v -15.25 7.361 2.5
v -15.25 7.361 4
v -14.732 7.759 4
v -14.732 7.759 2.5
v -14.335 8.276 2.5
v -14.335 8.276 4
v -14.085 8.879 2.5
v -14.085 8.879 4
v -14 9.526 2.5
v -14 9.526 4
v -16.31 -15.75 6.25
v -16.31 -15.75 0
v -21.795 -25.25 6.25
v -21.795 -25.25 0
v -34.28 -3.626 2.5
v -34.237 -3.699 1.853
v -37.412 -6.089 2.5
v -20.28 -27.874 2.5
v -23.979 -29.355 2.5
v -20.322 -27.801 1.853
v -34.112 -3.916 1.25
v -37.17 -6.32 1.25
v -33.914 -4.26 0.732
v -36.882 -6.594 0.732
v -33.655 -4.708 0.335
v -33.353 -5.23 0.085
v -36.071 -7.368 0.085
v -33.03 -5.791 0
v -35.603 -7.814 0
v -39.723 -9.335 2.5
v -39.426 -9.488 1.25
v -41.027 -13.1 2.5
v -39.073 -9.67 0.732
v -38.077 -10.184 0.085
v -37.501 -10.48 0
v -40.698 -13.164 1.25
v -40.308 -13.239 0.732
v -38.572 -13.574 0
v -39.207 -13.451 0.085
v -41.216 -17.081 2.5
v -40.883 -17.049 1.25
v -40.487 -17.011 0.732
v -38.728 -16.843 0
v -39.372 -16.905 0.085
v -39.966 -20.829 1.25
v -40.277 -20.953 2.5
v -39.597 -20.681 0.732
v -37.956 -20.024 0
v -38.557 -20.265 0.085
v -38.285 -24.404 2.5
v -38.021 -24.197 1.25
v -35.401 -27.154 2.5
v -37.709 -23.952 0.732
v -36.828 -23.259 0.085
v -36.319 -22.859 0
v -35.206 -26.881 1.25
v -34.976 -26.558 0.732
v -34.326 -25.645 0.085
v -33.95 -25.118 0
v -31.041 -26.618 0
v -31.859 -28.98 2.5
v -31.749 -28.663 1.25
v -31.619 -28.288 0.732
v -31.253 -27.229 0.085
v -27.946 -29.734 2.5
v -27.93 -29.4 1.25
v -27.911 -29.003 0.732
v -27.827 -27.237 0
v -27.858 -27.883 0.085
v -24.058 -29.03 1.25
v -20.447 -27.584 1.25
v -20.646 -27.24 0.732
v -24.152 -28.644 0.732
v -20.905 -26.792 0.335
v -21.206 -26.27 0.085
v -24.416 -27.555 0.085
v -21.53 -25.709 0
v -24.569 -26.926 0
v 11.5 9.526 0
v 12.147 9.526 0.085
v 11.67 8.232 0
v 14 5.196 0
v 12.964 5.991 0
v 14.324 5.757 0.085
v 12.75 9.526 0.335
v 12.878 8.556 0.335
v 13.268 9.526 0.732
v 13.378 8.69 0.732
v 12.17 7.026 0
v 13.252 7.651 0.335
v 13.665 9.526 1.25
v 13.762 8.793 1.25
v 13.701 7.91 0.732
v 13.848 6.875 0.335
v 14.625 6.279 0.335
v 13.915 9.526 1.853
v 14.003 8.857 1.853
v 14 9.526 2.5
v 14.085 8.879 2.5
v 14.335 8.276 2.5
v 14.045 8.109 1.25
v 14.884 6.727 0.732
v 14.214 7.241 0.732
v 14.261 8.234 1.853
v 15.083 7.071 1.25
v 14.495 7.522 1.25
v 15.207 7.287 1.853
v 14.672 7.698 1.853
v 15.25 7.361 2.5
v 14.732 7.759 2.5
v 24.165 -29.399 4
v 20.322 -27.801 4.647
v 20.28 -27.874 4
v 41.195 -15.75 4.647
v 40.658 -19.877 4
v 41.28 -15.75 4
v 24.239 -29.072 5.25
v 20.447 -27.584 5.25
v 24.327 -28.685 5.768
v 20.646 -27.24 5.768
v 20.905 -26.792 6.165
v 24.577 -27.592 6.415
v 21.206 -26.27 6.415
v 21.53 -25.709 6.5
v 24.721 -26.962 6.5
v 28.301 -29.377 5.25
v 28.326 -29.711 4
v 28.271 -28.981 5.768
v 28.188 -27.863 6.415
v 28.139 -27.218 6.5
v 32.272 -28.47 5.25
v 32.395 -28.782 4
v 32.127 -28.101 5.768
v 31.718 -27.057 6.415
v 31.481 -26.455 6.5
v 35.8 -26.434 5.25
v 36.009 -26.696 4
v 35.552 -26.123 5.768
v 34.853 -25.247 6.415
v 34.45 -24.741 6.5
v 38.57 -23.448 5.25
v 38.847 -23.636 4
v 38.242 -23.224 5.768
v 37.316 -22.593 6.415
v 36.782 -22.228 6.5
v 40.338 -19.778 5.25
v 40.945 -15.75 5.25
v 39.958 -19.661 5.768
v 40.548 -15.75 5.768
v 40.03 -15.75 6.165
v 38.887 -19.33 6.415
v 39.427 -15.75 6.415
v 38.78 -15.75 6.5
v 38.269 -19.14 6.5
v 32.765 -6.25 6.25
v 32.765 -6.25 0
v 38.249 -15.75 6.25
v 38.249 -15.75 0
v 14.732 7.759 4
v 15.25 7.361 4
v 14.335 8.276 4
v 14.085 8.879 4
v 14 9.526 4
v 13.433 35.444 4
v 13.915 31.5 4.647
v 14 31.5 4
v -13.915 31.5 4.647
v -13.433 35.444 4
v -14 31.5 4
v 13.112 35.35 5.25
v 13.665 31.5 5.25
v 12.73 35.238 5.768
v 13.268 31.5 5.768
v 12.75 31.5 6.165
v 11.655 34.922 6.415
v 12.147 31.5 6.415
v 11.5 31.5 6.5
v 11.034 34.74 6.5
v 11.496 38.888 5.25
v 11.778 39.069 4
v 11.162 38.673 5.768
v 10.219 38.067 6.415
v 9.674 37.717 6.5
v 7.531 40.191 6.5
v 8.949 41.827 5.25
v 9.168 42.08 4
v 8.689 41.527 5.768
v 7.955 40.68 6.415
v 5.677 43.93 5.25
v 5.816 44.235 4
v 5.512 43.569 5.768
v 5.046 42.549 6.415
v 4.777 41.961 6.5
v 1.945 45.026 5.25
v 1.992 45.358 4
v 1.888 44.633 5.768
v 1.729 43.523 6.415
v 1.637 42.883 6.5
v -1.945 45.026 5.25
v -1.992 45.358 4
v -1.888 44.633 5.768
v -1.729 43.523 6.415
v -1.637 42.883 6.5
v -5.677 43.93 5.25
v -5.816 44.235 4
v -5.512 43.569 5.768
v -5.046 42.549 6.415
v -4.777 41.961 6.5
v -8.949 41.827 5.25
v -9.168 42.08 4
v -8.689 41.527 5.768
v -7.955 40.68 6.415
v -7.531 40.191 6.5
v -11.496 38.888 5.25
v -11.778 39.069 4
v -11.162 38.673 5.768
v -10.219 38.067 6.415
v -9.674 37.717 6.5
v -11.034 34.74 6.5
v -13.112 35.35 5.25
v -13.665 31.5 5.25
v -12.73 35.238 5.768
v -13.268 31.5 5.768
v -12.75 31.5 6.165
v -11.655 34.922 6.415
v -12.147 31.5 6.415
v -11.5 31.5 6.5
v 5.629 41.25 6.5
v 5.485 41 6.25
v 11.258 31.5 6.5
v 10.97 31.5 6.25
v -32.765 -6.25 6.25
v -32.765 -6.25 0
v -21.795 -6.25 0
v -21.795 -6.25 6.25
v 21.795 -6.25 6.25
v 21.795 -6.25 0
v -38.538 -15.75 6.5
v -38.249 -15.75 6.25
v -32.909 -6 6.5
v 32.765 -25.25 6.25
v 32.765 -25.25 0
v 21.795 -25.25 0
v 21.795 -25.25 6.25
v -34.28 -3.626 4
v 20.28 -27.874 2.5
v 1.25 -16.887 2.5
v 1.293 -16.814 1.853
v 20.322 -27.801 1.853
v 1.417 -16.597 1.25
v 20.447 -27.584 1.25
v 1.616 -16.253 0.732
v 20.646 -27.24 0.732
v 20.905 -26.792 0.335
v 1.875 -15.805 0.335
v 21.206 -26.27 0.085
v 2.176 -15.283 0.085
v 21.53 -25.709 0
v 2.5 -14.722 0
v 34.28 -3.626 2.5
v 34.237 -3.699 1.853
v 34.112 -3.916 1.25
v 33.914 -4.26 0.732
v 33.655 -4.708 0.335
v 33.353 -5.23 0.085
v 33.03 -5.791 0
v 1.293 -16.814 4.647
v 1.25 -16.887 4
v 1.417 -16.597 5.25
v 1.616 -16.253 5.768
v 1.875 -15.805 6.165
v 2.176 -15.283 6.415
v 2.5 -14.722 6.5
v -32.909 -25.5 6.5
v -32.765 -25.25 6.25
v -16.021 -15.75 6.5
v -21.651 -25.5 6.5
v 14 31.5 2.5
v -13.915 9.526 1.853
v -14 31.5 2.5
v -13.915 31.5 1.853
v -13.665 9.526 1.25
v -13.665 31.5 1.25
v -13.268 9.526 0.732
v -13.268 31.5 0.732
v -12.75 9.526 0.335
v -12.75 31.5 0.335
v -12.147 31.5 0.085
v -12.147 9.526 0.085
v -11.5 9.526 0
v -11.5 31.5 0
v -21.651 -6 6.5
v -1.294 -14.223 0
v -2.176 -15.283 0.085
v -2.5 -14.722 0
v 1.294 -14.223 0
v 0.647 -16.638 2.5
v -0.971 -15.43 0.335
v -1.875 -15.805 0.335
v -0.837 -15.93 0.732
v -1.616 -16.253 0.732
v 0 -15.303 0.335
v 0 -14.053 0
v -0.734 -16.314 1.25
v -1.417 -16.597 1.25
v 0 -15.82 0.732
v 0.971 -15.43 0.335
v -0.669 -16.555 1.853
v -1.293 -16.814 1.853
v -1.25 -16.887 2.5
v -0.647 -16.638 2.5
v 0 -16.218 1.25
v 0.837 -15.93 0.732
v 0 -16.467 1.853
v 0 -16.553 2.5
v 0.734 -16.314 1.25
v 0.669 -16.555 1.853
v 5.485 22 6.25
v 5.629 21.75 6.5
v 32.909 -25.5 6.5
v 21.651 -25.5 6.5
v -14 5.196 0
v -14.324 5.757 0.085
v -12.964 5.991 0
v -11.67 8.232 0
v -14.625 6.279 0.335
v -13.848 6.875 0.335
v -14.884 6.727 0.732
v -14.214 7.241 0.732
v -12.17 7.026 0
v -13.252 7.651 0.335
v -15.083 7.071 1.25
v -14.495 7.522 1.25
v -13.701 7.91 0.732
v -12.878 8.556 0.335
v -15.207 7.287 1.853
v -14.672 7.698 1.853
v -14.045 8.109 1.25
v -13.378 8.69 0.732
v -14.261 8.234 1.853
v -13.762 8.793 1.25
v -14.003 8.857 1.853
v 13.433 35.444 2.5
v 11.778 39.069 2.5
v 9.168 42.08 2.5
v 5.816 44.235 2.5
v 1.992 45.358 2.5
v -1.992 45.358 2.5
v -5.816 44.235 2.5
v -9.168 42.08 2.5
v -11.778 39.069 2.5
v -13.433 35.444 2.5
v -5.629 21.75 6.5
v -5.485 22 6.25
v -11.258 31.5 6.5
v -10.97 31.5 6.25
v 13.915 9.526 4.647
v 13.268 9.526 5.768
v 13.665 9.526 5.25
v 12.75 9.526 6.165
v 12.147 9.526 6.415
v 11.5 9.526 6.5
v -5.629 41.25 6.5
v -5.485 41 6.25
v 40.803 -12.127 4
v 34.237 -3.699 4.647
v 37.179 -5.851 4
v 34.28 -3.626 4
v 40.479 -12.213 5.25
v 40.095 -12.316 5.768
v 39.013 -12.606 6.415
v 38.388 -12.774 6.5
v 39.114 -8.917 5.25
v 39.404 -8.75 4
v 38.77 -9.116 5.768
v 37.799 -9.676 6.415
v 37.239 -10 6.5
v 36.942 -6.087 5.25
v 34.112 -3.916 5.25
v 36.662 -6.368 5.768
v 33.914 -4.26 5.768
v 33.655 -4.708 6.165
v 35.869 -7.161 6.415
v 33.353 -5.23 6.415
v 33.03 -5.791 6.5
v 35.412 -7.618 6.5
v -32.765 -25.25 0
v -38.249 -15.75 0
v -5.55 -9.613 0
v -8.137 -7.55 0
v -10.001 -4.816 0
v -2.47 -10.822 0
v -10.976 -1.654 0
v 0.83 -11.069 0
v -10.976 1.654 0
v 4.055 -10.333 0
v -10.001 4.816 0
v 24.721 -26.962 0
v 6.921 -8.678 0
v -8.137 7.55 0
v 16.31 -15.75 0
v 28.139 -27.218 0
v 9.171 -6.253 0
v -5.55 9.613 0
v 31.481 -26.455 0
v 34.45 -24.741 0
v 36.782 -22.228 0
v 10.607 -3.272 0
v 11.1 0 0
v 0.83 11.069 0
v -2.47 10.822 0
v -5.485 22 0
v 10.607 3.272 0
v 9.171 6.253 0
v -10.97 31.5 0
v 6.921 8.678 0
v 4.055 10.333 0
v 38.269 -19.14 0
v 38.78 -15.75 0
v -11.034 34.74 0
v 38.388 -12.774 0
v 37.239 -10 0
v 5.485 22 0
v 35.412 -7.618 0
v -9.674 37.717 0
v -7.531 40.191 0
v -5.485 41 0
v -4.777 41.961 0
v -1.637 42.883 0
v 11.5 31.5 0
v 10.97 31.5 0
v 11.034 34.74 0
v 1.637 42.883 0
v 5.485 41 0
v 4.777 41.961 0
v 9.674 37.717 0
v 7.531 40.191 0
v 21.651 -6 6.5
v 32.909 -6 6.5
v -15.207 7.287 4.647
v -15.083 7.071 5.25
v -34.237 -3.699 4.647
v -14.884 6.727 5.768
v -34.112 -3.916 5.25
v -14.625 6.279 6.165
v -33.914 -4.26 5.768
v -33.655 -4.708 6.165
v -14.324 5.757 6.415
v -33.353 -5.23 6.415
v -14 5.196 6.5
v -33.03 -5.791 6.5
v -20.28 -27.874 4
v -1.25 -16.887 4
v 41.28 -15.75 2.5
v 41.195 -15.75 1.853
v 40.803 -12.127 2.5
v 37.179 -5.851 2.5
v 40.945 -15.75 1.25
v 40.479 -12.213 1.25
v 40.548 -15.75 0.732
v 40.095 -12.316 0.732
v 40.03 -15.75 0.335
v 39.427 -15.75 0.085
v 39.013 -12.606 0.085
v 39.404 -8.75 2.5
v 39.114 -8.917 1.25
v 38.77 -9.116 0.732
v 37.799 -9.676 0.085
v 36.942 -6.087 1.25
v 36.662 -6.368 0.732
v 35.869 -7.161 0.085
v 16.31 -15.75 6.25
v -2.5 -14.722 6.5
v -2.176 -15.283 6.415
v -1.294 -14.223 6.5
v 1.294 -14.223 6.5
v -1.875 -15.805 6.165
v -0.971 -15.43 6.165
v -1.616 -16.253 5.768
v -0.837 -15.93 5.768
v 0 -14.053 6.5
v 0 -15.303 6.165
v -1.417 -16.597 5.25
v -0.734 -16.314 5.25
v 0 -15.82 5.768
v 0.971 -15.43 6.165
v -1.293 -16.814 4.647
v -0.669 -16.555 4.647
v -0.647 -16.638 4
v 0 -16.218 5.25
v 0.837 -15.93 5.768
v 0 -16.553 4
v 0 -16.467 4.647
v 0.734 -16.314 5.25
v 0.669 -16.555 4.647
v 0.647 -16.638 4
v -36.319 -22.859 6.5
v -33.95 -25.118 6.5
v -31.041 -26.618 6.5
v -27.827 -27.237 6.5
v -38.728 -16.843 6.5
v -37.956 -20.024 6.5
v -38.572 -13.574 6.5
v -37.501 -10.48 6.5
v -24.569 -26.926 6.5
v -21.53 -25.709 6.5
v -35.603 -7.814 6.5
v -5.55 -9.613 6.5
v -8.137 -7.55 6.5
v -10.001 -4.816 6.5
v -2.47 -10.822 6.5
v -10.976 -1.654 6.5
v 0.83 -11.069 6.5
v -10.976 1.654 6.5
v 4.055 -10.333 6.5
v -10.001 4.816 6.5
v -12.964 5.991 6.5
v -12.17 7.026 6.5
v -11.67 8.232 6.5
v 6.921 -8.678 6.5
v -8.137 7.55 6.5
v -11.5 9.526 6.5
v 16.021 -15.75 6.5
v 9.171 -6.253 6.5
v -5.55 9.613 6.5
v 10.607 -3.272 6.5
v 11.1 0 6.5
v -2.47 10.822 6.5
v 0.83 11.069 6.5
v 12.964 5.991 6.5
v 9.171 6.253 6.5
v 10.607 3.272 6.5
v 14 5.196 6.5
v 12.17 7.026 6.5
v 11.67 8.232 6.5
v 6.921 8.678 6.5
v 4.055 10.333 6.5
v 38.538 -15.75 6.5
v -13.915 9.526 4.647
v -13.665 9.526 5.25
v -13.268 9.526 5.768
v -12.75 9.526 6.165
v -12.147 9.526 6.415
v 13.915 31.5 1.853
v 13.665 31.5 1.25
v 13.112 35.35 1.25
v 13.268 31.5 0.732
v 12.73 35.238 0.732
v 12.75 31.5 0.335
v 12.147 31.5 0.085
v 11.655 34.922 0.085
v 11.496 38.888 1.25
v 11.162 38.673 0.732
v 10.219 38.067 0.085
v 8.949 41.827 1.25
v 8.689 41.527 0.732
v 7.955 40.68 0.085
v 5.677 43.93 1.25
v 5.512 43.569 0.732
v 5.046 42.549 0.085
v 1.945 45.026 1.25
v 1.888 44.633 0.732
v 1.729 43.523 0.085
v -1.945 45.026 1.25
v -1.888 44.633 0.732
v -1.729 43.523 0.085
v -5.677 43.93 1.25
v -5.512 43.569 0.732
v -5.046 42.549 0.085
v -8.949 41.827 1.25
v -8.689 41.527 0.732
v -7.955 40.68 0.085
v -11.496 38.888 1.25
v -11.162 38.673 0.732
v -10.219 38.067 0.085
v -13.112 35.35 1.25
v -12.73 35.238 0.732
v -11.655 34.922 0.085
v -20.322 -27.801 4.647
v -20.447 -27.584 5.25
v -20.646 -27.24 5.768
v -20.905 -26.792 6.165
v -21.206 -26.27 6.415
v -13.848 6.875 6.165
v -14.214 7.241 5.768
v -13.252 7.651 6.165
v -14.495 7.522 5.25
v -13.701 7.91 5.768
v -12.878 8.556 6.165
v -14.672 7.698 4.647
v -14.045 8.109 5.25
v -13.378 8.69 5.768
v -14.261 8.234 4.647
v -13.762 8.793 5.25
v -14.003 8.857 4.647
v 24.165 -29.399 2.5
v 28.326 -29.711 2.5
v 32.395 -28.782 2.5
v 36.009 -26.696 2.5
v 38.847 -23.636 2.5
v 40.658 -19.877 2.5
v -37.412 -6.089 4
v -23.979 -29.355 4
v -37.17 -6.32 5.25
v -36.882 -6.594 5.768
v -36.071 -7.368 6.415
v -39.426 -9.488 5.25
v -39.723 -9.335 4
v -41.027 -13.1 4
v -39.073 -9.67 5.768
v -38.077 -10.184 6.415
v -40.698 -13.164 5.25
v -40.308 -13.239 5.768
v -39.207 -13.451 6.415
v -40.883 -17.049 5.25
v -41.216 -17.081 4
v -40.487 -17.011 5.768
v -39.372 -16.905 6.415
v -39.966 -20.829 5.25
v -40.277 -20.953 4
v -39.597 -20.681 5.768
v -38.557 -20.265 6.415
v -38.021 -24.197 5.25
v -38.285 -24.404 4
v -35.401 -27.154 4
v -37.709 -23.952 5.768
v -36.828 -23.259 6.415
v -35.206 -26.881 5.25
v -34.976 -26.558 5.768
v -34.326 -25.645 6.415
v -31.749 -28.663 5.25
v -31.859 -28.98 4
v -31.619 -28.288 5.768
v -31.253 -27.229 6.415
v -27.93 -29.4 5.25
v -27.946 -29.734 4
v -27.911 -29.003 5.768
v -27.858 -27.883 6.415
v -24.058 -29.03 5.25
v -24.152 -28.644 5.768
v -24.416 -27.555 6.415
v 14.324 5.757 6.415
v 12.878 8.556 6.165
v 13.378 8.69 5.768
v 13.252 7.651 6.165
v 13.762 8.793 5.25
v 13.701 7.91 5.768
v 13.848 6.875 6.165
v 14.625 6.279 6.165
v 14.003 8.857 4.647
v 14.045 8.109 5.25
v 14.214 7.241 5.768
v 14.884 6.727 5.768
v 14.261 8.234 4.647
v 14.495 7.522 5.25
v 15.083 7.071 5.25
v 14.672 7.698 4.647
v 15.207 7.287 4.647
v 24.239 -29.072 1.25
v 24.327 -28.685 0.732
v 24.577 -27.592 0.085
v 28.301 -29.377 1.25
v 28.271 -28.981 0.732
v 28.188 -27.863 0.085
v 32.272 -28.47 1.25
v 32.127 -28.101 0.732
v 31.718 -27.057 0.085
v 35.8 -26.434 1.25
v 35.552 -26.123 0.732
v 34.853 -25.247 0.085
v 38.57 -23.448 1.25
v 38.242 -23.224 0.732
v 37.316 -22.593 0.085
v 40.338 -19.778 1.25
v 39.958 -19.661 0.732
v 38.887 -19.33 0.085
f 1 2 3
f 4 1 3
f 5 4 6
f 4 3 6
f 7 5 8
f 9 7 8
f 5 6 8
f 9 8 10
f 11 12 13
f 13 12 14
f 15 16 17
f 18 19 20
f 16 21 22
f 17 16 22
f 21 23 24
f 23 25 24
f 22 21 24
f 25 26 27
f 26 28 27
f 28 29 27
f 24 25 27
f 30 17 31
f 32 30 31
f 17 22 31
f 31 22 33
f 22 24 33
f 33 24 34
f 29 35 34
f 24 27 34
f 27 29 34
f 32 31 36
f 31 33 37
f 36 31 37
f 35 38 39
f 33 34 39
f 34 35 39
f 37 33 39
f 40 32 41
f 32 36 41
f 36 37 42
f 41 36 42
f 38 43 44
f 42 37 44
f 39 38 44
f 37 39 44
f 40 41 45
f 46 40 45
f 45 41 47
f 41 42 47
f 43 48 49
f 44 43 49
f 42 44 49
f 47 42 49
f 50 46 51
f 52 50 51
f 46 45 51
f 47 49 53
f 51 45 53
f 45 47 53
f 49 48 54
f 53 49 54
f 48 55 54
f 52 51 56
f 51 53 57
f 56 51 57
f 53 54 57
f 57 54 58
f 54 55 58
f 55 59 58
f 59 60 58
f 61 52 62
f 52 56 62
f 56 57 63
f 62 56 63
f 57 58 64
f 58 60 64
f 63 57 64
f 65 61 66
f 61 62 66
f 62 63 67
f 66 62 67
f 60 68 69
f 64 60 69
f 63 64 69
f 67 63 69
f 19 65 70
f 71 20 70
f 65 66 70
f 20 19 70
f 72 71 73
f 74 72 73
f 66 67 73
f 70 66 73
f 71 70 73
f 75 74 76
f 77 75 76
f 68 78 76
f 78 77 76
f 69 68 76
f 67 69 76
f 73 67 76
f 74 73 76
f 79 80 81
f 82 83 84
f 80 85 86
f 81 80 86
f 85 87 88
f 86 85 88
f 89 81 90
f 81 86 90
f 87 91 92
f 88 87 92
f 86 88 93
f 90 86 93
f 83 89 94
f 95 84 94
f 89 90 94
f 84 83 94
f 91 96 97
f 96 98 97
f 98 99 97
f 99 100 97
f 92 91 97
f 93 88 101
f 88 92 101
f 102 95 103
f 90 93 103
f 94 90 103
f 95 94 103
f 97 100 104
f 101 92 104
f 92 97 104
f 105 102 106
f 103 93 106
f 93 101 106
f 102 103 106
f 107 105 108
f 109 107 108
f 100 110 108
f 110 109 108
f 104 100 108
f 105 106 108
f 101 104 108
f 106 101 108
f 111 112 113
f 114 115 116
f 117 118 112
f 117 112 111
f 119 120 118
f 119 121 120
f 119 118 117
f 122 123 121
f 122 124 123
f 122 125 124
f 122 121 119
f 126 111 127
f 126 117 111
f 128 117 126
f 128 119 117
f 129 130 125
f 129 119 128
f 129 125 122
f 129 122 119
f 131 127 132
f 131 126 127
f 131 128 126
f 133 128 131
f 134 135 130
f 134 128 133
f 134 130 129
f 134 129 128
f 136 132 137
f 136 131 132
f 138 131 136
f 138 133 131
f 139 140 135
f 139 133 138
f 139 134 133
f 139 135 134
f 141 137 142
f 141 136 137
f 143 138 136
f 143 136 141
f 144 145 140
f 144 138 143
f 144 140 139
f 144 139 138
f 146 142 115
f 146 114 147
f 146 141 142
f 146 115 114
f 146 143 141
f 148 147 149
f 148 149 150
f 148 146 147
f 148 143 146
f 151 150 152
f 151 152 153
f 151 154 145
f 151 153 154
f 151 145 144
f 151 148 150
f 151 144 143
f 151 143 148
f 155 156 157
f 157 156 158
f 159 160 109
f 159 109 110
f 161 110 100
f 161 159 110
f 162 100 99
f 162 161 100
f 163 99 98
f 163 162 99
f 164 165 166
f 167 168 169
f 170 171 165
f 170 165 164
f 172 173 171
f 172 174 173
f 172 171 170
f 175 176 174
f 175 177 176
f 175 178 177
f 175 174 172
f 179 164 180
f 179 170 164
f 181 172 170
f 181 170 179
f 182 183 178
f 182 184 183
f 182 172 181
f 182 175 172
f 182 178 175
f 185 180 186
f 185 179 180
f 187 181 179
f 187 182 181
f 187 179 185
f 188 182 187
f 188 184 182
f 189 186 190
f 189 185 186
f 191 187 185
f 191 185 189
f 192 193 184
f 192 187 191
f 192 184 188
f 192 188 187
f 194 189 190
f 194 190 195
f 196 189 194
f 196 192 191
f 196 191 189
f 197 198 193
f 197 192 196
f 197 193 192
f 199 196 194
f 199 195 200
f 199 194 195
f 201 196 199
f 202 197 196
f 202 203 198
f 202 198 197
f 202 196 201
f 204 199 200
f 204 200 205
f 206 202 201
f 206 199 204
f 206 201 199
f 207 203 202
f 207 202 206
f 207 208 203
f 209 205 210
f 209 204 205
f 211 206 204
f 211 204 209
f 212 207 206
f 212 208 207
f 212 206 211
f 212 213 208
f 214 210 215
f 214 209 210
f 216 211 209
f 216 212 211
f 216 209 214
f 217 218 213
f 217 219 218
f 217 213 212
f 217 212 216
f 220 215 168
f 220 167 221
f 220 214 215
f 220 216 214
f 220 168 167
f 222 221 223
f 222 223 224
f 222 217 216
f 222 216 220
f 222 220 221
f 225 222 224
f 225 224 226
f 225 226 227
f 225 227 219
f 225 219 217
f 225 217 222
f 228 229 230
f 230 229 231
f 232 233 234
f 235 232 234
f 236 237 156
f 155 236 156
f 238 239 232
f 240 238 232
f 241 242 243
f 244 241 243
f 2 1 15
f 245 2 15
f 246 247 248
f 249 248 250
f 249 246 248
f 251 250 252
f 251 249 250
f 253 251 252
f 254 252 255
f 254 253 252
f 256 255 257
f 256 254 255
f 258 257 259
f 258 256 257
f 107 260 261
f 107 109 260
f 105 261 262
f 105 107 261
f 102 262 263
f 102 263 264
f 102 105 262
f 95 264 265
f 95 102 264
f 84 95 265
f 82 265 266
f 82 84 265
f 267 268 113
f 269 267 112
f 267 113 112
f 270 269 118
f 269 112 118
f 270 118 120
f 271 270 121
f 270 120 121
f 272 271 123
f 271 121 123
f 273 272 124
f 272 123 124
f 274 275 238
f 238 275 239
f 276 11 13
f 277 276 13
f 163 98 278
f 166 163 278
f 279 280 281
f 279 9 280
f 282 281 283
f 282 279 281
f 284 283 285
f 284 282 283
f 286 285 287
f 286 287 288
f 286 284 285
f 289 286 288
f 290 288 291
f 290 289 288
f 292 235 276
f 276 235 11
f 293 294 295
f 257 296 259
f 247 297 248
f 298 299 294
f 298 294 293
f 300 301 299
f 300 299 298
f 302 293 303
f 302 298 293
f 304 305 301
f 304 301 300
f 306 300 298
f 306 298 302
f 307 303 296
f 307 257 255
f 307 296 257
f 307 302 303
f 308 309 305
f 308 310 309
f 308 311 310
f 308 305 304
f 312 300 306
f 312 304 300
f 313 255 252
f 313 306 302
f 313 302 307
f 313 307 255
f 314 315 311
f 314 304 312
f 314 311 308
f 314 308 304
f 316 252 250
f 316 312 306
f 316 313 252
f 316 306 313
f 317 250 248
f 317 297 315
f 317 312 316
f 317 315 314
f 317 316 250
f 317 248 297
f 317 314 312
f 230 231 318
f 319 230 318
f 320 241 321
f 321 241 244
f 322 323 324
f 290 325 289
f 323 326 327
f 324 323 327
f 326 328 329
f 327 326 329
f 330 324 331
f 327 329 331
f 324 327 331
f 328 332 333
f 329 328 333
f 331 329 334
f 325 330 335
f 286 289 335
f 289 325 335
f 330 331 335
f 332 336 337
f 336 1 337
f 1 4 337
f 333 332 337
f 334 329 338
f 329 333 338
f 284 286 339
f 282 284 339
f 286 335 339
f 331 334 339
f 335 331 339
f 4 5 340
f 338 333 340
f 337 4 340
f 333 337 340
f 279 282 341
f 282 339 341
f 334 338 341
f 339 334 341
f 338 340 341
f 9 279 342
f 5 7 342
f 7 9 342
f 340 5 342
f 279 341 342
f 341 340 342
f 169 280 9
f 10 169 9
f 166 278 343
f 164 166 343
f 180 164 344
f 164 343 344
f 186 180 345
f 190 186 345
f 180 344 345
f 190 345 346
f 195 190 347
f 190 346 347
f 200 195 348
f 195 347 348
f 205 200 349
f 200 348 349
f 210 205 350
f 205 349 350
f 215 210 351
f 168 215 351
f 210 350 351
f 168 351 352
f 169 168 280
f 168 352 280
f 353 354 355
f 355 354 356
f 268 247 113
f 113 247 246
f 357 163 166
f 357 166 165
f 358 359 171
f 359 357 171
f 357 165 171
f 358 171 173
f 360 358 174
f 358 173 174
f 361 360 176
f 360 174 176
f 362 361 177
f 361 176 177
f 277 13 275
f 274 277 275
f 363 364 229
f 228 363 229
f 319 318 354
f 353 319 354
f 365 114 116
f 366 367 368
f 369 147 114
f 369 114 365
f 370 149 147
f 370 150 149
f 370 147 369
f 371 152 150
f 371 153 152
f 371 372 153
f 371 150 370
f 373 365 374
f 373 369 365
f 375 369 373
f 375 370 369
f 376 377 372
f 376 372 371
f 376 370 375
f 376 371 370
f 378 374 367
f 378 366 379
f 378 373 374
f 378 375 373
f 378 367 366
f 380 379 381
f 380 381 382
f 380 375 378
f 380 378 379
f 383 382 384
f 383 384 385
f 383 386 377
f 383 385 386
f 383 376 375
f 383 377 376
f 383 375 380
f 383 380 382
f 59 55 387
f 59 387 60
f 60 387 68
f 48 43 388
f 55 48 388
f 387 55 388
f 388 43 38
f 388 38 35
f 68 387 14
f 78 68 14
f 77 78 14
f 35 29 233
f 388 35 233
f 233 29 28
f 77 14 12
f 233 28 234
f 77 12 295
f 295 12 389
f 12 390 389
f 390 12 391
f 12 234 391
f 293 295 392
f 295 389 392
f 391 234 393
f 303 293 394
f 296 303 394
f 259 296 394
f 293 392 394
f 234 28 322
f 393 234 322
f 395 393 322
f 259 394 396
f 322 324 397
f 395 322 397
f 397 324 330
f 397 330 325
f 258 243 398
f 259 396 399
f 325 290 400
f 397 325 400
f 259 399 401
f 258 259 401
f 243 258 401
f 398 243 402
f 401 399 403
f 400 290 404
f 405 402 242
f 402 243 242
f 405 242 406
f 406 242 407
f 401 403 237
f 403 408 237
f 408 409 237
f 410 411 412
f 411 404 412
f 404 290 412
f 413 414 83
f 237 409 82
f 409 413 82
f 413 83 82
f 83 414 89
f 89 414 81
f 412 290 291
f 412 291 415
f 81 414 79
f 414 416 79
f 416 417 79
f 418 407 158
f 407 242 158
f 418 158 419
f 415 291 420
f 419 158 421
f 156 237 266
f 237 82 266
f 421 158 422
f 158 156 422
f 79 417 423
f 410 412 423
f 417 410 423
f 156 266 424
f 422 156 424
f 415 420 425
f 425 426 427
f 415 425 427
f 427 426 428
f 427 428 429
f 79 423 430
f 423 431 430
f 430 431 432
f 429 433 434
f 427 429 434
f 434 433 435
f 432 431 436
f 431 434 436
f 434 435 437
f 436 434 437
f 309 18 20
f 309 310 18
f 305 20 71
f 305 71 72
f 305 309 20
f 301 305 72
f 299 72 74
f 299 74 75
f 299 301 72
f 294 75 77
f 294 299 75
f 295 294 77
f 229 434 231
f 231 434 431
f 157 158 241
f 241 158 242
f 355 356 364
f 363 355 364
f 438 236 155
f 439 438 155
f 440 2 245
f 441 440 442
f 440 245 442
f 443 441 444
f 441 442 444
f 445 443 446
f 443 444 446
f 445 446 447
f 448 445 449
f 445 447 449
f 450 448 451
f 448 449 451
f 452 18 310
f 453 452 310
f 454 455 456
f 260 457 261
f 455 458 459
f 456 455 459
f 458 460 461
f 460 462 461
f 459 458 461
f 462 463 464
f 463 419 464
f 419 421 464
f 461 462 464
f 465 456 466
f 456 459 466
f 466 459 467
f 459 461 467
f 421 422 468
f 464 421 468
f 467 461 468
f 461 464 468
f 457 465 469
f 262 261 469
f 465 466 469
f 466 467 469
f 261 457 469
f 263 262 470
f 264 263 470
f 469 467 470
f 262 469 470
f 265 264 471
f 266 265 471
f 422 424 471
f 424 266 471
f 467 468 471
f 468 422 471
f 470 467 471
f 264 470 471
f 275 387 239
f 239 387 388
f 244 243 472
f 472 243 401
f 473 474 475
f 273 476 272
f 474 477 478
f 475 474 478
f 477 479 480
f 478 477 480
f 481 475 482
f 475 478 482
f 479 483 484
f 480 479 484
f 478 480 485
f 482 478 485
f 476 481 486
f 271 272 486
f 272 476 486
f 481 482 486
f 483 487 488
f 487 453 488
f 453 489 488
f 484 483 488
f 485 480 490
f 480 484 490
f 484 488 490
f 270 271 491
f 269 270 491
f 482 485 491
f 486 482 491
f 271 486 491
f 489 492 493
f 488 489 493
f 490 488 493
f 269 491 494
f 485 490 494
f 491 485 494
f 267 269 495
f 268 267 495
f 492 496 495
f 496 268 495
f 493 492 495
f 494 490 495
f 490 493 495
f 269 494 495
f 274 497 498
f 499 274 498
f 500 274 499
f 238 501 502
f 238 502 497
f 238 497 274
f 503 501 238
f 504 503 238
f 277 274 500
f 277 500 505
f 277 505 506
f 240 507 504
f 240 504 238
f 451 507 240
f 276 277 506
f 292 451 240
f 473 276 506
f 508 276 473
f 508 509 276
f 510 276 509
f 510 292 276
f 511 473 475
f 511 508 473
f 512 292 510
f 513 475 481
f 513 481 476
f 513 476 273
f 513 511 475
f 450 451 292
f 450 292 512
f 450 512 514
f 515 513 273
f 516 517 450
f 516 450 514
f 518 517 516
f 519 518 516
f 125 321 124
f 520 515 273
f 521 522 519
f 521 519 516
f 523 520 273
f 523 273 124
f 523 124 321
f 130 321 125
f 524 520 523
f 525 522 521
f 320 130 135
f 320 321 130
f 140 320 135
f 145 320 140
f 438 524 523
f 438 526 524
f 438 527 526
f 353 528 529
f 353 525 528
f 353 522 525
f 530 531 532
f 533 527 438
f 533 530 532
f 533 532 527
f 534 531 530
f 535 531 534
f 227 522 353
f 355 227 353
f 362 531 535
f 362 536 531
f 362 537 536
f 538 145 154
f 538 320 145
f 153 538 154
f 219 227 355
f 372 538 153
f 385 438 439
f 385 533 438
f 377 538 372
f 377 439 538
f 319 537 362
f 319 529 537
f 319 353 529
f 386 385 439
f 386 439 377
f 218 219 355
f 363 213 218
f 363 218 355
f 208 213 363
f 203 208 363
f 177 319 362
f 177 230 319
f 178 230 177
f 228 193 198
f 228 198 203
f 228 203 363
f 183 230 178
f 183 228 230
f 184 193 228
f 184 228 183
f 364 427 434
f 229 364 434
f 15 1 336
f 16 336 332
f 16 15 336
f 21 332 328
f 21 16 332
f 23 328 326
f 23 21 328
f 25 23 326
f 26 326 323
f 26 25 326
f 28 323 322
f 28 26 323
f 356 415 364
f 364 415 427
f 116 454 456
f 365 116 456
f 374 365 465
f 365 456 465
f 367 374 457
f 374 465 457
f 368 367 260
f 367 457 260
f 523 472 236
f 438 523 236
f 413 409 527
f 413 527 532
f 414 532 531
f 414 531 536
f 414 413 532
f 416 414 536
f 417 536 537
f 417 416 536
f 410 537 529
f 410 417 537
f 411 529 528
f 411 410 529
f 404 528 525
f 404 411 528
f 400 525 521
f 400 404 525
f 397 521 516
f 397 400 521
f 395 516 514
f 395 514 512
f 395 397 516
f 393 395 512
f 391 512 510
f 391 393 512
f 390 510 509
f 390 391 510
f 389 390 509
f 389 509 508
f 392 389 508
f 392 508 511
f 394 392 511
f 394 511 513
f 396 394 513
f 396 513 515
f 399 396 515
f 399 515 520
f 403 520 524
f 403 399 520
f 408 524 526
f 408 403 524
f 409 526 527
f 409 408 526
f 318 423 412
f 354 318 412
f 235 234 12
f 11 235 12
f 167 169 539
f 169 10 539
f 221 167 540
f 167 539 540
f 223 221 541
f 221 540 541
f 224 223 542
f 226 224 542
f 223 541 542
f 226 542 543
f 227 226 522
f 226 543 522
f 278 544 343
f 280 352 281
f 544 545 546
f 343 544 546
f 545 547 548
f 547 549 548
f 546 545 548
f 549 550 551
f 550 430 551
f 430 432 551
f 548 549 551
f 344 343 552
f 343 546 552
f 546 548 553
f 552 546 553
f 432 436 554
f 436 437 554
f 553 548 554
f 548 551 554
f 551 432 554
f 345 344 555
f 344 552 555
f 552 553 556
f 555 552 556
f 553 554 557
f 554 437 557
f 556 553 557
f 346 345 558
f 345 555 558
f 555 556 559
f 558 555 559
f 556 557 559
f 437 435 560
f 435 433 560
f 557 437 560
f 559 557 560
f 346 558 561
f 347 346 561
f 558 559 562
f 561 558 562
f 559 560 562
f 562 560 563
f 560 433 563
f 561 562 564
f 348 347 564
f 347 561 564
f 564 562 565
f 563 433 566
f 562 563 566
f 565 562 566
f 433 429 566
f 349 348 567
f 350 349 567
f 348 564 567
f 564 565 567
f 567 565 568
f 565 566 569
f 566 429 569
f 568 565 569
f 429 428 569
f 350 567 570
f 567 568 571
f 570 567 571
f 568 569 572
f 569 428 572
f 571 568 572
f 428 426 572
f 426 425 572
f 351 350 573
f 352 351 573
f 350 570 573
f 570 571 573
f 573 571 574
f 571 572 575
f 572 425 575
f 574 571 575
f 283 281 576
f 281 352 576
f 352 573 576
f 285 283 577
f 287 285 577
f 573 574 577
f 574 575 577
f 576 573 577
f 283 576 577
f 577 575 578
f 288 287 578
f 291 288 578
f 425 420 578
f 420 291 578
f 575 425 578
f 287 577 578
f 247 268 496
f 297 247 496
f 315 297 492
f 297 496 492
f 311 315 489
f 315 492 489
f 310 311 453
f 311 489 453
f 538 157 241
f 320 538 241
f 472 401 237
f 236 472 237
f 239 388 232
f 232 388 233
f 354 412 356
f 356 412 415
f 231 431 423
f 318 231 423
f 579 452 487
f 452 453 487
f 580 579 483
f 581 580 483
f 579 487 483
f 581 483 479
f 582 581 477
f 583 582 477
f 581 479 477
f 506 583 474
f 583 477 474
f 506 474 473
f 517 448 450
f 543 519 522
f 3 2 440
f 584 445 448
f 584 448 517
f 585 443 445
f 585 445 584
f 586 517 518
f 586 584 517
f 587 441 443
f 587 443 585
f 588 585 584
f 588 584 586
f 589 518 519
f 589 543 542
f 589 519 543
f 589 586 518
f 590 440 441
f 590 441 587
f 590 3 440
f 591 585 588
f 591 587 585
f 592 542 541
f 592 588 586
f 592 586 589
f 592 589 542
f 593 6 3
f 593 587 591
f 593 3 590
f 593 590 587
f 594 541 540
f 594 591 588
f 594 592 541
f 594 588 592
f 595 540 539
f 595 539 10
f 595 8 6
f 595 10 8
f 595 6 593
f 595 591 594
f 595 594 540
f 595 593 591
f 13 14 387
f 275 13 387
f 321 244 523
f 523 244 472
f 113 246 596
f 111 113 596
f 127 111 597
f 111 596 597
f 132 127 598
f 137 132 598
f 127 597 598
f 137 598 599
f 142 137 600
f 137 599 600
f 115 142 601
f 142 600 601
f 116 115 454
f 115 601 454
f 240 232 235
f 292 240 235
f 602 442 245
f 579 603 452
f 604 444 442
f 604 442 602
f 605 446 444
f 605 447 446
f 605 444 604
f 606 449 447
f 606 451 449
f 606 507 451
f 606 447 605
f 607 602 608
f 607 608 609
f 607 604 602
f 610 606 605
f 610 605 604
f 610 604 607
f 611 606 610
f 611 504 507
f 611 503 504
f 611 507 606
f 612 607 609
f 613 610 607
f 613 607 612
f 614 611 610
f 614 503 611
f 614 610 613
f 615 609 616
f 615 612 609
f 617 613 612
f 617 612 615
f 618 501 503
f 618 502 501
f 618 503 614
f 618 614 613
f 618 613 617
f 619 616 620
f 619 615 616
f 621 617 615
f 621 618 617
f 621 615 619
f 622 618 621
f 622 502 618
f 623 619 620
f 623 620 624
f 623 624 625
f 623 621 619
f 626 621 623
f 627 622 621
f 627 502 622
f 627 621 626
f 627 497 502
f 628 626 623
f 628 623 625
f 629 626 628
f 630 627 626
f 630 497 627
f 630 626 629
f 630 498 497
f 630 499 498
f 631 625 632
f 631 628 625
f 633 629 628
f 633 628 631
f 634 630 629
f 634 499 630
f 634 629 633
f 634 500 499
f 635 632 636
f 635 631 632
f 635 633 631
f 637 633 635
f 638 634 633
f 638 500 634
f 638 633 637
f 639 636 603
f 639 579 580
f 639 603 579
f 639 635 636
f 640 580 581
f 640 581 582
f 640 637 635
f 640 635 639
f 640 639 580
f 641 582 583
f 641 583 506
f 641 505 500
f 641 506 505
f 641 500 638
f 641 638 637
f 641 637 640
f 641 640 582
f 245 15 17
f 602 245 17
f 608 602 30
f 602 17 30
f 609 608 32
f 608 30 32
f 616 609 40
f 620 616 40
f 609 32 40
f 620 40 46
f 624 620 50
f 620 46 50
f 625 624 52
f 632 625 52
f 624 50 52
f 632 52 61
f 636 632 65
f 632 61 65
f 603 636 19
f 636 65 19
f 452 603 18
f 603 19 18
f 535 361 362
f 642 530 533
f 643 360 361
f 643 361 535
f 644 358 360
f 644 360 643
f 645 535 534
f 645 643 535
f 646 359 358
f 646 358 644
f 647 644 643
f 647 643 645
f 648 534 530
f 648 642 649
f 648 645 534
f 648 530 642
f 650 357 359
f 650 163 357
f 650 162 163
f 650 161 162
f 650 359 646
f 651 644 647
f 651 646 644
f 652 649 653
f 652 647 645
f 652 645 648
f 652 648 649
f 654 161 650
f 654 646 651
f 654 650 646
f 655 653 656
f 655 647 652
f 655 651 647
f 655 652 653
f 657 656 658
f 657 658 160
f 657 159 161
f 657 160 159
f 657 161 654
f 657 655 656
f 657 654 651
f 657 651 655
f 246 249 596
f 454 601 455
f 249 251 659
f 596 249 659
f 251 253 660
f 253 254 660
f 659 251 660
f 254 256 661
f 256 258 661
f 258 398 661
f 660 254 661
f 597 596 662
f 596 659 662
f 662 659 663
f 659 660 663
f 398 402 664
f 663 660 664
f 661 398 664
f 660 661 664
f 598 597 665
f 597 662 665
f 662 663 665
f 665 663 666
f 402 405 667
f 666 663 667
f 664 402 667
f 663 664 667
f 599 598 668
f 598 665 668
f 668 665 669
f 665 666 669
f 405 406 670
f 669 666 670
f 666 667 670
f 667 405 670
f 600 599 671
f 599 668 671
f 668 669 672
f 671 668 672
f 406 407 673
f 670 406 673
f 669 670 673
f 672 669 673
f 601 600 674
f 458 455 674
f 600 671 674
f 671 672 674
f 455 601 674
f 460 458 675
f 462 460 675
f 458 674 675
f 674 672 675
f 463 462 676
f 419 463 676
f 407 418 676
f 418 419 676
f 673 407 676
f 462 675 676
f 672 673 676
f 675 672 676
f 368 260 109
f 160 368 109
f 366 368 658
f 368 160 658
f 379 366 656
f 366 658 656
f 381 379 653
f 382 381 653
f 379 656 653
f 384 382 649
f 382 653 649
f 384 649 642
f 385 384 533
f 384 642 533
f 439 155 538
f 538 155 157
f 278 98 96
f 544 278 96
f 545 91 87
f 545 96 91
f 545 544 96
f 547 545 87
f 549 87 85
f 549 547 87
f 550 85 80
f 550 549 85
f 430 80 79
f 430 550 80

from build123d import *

# Parameters (mm, degrees)
F0_R     = 11.1
F1_DEPTH = 6.5
F2_R     = 2.5
F3_SIZE  = 0.25


with BuildPart() as f1:
    # F0 (on Top) → F1 (new body)
    with BuildSketch(Plane.XY):
        with BuildLine():
            Line((14, 8.0829037687), (14, 0))
            ThreePointArc((14, 0), (12.124355653, -7), (7, -12.124355653))
            Line((7, -12.124355653), (0, -16.1658075373))
            Line((0, -16.1658075373), (20.2798002192, -27.874355653))
            ThreePointArc((20.2798002192, -27.874355653), (15.1554445662, -8.75), (34.2798002192, -3.625644347))
            Line((34.2798002192, -3.625644347), (14, 8.0829037687))
        make_face()
        with BuildLine():
            ThreePointArc((7, 12.124355653), (12.124355653, 7), (14, 0))
            Line((14, 0), (14, 8.0829037687))
            Line((14, 8.0829037687), (7, 12.124355653))
        make_face()
        with BuildLine():
            ThreePointArc((-7, 12.124355653), (0, 14), (7, 12.124355653))
            Line((7, 12.124355653), (14, 8.0829037687))
            Line((14, 8.0829037687), (14, 31.5))
            ThreePointArc((14, 31.5), (0, 17.5), (-14, 31.5))
            Line((-14, 31.5), (-14, 8.0829037687))
            Line((-14, 8.0829037687), (-7, 12.124355653))
        make_face()
        with BuildLine():
            Line((0, -16.1658075373), (7, -12.124355653))
            ThreePointArc((7, -12.124355653), (0, -14), (-7, -12.124355653))
            Line((-7, -12.124355653), (0, -16.1658075373))
        make_face()
        with BuildLine():
            ThreePointArc((-14, 0), (-12.124355653, 7), (-7, 12.124355653))
            Line((-7, 12.124355653), (-14, 8.0829037687))
            Line((-14, 8.0829037687), (-14, 0))
        make_face()
        with BuildLine():
            Line((0, -16.1658075373), (-7, -12.124355653))
            ThreePointArc((-7, -12.124355653), (-12.124355653, -7), (-14, 0))
            Line((-14, 0), (-14, 8.0829037687))
            Line((-14, 8.0829037687), (-34.2798002192, -3.625644347))
            ThreePointArc((-34.2798002192, -3.625644347), (-20.2798002192, -3.625644347), (-13.2798002192, -15.75))
            ThreePointArc((-13.2798002192, -15.75), (-15.1554445662, -22.75), (-20.2798002192, -27.874355653))
            Line((-20.2798002192, -27.874355653), (0, -16.1658075373))
        make_face()
        with BuildLine():
            ThreePointArc((-14, 31.5), (0, 17.5), (14, 31.5))
            ThreePointArc((14, 31.5), (0, 45.5), (-14, 31.5))
        make_face()
        Polygon((10.9696551146, 31.5), (5.4848275573, 22), (-5.4848275573, 22), (-10.9696551146, 31.5), (-5.4848275573, 41), (5.4848275573, 41), align=None, mode=Mode.SUBTRACT)
        with BuildLine():
            ThreePointArc((41.2798002192, -15.75), (39.4041558722, -8.75), (34.2798002192, -3.625644347))
            ThreePointArc((34.2798002192, -3.625644347), (15.1554445662, -8.75), (20.2798002192, -27.874355653))
            ThreePointArc((20.2798002192, -27.874355653), (34.2798002192, -27.874355653), (41.2798002192, -15.75))
        make_face()
        Polygon((16.3101451046, -15.75), (21.7949726619, -6.25), (32.7646277765, -6.25), (38.2494553338, -15.75), (32.7646277765, -25.25), (21.7949726619, -25.25), align=None, mode=Mode.SUBTRACT)
        with BuildLine():
            ThreePointArc((-34.2798002192, -3.625644347), (-39.4041558722, -22.75), (-20.2798002192, -27.874355653))
            ThreePointArc((-20.2798002192, -27.874355653), (-15.1554445662, -22.75), (-13.2798002192, -15.75))
            ThreePointArc((-13.2798002192, -15.75), (-20.2798002192, -3.625644347), (-34.2798002192, -3.625644347))
        make_face()
        Polygon((-21.7949726619, -6.25), (-16.3101451046, -15.75), (-21.7949726619, -25.25), (-32.7646277765, -25.25), (-38.2494553338, -15.75), (-32.7646277765, -6.25), align=None, mode=Mode.SUBTRACT)
        with BuildLine():
            ThreePointArc((7, -12.124355653), (12.124355653, -7), (14, 0))
            ThreePointArc((14, 0), (12.124355653, 7), (7, 12.124355653))
            ThreePointArc((7, 12.124355653), (0, 14), (-7, 12.124355653))
            ThreePointArc((-7, 12.124355653), (-12.124355653, 7), (-14, 0))
            ThreePointArc((-14, 0), (-12.124355653, -7), (-7, -12.124355653))
            ThreePointArc((-7, -12.124355653), (0, -14), (7, -12.124355653))
        make_face()
        Circle(F0_R, mode=Mode.SUBTRACT)
    extrude(amount=F1_DEPTH)

    # F2
    f2_edges = [f1.edges().sort_by_distance(p)[0] for p in [
        (-20.2798, -27.874356, 3.25),
        (0, -16.165808, 3.25),
        (-10.1399, -22.020082, 0),
        (-10.1399, -22.020082, 6.5),
        (-34.2798, -3.625644, 3.25),
        (-39.404156, -22.75, 0),
        (-39.404156, -22.75, 6.5),
        (20.2798, -27.874356, 3.25),
        (10.1399, -22.020082, 0),
        (10.1399, -22.020082, 6.5),
        (34.2798, -3.625644, 3.25),
        (39.404156, -22.75, 0),
        (39.404156, -22.75, 6.5),
        (14, 8.082904, 3.25),
        (24.1399, 2.22863, 0),
        (24.1399, 2.22863, 6.5),
        (14, 31.5, 3.25),
        (14, 19.791452, 0),
        (14, 19.791452, 6.5),
        (-14, 31.5, 3.25),
        (-14, 8.082904, 3.25),
        (-14, 19.791452, 0),
        (-14, 19.791452, 6.5),
        (-24.1399, 2.22863, 0),
        (-24.1399, 2.22863, 6.5),
    ]]
    fillet(f2_edges, radius=F2_R)

    # F3
    f3_edges = [f1.edges().sort_by_distance(p)[0] for p in [
        (19.052559, -20.5, 6.5),
        (19.052559, -11, 6.5),
        (27.2798, -6.25, 6.5),
        (35.507042, -11, 6.5),
        (35.507042, -20.5, 6.5),
        (27.2798, -25.25, 6.5),
        (-35.507042, -20.5, 6.5),
        (-35.507042, -11, 6.5),
        (-27.2798, -6.25, 6.5),
        (-19.052559, -11, 6.5),
        (-19.052559, -20.5, 6.5),
        (-27.2798, -25.25, 6.5),
        (0, 22, 6.5),
        (8.227241, 26.75, 6.5),
        (8.227241, 36.25, 6.5),
        (0, 41, 6.5),
        (-8.227241, 36.25, 6.5),
        (-8.227241, 26.75, 6.5),
    ]]
    chamfer(f3_edges, length=F3_SIZE)


solid = f1.part
